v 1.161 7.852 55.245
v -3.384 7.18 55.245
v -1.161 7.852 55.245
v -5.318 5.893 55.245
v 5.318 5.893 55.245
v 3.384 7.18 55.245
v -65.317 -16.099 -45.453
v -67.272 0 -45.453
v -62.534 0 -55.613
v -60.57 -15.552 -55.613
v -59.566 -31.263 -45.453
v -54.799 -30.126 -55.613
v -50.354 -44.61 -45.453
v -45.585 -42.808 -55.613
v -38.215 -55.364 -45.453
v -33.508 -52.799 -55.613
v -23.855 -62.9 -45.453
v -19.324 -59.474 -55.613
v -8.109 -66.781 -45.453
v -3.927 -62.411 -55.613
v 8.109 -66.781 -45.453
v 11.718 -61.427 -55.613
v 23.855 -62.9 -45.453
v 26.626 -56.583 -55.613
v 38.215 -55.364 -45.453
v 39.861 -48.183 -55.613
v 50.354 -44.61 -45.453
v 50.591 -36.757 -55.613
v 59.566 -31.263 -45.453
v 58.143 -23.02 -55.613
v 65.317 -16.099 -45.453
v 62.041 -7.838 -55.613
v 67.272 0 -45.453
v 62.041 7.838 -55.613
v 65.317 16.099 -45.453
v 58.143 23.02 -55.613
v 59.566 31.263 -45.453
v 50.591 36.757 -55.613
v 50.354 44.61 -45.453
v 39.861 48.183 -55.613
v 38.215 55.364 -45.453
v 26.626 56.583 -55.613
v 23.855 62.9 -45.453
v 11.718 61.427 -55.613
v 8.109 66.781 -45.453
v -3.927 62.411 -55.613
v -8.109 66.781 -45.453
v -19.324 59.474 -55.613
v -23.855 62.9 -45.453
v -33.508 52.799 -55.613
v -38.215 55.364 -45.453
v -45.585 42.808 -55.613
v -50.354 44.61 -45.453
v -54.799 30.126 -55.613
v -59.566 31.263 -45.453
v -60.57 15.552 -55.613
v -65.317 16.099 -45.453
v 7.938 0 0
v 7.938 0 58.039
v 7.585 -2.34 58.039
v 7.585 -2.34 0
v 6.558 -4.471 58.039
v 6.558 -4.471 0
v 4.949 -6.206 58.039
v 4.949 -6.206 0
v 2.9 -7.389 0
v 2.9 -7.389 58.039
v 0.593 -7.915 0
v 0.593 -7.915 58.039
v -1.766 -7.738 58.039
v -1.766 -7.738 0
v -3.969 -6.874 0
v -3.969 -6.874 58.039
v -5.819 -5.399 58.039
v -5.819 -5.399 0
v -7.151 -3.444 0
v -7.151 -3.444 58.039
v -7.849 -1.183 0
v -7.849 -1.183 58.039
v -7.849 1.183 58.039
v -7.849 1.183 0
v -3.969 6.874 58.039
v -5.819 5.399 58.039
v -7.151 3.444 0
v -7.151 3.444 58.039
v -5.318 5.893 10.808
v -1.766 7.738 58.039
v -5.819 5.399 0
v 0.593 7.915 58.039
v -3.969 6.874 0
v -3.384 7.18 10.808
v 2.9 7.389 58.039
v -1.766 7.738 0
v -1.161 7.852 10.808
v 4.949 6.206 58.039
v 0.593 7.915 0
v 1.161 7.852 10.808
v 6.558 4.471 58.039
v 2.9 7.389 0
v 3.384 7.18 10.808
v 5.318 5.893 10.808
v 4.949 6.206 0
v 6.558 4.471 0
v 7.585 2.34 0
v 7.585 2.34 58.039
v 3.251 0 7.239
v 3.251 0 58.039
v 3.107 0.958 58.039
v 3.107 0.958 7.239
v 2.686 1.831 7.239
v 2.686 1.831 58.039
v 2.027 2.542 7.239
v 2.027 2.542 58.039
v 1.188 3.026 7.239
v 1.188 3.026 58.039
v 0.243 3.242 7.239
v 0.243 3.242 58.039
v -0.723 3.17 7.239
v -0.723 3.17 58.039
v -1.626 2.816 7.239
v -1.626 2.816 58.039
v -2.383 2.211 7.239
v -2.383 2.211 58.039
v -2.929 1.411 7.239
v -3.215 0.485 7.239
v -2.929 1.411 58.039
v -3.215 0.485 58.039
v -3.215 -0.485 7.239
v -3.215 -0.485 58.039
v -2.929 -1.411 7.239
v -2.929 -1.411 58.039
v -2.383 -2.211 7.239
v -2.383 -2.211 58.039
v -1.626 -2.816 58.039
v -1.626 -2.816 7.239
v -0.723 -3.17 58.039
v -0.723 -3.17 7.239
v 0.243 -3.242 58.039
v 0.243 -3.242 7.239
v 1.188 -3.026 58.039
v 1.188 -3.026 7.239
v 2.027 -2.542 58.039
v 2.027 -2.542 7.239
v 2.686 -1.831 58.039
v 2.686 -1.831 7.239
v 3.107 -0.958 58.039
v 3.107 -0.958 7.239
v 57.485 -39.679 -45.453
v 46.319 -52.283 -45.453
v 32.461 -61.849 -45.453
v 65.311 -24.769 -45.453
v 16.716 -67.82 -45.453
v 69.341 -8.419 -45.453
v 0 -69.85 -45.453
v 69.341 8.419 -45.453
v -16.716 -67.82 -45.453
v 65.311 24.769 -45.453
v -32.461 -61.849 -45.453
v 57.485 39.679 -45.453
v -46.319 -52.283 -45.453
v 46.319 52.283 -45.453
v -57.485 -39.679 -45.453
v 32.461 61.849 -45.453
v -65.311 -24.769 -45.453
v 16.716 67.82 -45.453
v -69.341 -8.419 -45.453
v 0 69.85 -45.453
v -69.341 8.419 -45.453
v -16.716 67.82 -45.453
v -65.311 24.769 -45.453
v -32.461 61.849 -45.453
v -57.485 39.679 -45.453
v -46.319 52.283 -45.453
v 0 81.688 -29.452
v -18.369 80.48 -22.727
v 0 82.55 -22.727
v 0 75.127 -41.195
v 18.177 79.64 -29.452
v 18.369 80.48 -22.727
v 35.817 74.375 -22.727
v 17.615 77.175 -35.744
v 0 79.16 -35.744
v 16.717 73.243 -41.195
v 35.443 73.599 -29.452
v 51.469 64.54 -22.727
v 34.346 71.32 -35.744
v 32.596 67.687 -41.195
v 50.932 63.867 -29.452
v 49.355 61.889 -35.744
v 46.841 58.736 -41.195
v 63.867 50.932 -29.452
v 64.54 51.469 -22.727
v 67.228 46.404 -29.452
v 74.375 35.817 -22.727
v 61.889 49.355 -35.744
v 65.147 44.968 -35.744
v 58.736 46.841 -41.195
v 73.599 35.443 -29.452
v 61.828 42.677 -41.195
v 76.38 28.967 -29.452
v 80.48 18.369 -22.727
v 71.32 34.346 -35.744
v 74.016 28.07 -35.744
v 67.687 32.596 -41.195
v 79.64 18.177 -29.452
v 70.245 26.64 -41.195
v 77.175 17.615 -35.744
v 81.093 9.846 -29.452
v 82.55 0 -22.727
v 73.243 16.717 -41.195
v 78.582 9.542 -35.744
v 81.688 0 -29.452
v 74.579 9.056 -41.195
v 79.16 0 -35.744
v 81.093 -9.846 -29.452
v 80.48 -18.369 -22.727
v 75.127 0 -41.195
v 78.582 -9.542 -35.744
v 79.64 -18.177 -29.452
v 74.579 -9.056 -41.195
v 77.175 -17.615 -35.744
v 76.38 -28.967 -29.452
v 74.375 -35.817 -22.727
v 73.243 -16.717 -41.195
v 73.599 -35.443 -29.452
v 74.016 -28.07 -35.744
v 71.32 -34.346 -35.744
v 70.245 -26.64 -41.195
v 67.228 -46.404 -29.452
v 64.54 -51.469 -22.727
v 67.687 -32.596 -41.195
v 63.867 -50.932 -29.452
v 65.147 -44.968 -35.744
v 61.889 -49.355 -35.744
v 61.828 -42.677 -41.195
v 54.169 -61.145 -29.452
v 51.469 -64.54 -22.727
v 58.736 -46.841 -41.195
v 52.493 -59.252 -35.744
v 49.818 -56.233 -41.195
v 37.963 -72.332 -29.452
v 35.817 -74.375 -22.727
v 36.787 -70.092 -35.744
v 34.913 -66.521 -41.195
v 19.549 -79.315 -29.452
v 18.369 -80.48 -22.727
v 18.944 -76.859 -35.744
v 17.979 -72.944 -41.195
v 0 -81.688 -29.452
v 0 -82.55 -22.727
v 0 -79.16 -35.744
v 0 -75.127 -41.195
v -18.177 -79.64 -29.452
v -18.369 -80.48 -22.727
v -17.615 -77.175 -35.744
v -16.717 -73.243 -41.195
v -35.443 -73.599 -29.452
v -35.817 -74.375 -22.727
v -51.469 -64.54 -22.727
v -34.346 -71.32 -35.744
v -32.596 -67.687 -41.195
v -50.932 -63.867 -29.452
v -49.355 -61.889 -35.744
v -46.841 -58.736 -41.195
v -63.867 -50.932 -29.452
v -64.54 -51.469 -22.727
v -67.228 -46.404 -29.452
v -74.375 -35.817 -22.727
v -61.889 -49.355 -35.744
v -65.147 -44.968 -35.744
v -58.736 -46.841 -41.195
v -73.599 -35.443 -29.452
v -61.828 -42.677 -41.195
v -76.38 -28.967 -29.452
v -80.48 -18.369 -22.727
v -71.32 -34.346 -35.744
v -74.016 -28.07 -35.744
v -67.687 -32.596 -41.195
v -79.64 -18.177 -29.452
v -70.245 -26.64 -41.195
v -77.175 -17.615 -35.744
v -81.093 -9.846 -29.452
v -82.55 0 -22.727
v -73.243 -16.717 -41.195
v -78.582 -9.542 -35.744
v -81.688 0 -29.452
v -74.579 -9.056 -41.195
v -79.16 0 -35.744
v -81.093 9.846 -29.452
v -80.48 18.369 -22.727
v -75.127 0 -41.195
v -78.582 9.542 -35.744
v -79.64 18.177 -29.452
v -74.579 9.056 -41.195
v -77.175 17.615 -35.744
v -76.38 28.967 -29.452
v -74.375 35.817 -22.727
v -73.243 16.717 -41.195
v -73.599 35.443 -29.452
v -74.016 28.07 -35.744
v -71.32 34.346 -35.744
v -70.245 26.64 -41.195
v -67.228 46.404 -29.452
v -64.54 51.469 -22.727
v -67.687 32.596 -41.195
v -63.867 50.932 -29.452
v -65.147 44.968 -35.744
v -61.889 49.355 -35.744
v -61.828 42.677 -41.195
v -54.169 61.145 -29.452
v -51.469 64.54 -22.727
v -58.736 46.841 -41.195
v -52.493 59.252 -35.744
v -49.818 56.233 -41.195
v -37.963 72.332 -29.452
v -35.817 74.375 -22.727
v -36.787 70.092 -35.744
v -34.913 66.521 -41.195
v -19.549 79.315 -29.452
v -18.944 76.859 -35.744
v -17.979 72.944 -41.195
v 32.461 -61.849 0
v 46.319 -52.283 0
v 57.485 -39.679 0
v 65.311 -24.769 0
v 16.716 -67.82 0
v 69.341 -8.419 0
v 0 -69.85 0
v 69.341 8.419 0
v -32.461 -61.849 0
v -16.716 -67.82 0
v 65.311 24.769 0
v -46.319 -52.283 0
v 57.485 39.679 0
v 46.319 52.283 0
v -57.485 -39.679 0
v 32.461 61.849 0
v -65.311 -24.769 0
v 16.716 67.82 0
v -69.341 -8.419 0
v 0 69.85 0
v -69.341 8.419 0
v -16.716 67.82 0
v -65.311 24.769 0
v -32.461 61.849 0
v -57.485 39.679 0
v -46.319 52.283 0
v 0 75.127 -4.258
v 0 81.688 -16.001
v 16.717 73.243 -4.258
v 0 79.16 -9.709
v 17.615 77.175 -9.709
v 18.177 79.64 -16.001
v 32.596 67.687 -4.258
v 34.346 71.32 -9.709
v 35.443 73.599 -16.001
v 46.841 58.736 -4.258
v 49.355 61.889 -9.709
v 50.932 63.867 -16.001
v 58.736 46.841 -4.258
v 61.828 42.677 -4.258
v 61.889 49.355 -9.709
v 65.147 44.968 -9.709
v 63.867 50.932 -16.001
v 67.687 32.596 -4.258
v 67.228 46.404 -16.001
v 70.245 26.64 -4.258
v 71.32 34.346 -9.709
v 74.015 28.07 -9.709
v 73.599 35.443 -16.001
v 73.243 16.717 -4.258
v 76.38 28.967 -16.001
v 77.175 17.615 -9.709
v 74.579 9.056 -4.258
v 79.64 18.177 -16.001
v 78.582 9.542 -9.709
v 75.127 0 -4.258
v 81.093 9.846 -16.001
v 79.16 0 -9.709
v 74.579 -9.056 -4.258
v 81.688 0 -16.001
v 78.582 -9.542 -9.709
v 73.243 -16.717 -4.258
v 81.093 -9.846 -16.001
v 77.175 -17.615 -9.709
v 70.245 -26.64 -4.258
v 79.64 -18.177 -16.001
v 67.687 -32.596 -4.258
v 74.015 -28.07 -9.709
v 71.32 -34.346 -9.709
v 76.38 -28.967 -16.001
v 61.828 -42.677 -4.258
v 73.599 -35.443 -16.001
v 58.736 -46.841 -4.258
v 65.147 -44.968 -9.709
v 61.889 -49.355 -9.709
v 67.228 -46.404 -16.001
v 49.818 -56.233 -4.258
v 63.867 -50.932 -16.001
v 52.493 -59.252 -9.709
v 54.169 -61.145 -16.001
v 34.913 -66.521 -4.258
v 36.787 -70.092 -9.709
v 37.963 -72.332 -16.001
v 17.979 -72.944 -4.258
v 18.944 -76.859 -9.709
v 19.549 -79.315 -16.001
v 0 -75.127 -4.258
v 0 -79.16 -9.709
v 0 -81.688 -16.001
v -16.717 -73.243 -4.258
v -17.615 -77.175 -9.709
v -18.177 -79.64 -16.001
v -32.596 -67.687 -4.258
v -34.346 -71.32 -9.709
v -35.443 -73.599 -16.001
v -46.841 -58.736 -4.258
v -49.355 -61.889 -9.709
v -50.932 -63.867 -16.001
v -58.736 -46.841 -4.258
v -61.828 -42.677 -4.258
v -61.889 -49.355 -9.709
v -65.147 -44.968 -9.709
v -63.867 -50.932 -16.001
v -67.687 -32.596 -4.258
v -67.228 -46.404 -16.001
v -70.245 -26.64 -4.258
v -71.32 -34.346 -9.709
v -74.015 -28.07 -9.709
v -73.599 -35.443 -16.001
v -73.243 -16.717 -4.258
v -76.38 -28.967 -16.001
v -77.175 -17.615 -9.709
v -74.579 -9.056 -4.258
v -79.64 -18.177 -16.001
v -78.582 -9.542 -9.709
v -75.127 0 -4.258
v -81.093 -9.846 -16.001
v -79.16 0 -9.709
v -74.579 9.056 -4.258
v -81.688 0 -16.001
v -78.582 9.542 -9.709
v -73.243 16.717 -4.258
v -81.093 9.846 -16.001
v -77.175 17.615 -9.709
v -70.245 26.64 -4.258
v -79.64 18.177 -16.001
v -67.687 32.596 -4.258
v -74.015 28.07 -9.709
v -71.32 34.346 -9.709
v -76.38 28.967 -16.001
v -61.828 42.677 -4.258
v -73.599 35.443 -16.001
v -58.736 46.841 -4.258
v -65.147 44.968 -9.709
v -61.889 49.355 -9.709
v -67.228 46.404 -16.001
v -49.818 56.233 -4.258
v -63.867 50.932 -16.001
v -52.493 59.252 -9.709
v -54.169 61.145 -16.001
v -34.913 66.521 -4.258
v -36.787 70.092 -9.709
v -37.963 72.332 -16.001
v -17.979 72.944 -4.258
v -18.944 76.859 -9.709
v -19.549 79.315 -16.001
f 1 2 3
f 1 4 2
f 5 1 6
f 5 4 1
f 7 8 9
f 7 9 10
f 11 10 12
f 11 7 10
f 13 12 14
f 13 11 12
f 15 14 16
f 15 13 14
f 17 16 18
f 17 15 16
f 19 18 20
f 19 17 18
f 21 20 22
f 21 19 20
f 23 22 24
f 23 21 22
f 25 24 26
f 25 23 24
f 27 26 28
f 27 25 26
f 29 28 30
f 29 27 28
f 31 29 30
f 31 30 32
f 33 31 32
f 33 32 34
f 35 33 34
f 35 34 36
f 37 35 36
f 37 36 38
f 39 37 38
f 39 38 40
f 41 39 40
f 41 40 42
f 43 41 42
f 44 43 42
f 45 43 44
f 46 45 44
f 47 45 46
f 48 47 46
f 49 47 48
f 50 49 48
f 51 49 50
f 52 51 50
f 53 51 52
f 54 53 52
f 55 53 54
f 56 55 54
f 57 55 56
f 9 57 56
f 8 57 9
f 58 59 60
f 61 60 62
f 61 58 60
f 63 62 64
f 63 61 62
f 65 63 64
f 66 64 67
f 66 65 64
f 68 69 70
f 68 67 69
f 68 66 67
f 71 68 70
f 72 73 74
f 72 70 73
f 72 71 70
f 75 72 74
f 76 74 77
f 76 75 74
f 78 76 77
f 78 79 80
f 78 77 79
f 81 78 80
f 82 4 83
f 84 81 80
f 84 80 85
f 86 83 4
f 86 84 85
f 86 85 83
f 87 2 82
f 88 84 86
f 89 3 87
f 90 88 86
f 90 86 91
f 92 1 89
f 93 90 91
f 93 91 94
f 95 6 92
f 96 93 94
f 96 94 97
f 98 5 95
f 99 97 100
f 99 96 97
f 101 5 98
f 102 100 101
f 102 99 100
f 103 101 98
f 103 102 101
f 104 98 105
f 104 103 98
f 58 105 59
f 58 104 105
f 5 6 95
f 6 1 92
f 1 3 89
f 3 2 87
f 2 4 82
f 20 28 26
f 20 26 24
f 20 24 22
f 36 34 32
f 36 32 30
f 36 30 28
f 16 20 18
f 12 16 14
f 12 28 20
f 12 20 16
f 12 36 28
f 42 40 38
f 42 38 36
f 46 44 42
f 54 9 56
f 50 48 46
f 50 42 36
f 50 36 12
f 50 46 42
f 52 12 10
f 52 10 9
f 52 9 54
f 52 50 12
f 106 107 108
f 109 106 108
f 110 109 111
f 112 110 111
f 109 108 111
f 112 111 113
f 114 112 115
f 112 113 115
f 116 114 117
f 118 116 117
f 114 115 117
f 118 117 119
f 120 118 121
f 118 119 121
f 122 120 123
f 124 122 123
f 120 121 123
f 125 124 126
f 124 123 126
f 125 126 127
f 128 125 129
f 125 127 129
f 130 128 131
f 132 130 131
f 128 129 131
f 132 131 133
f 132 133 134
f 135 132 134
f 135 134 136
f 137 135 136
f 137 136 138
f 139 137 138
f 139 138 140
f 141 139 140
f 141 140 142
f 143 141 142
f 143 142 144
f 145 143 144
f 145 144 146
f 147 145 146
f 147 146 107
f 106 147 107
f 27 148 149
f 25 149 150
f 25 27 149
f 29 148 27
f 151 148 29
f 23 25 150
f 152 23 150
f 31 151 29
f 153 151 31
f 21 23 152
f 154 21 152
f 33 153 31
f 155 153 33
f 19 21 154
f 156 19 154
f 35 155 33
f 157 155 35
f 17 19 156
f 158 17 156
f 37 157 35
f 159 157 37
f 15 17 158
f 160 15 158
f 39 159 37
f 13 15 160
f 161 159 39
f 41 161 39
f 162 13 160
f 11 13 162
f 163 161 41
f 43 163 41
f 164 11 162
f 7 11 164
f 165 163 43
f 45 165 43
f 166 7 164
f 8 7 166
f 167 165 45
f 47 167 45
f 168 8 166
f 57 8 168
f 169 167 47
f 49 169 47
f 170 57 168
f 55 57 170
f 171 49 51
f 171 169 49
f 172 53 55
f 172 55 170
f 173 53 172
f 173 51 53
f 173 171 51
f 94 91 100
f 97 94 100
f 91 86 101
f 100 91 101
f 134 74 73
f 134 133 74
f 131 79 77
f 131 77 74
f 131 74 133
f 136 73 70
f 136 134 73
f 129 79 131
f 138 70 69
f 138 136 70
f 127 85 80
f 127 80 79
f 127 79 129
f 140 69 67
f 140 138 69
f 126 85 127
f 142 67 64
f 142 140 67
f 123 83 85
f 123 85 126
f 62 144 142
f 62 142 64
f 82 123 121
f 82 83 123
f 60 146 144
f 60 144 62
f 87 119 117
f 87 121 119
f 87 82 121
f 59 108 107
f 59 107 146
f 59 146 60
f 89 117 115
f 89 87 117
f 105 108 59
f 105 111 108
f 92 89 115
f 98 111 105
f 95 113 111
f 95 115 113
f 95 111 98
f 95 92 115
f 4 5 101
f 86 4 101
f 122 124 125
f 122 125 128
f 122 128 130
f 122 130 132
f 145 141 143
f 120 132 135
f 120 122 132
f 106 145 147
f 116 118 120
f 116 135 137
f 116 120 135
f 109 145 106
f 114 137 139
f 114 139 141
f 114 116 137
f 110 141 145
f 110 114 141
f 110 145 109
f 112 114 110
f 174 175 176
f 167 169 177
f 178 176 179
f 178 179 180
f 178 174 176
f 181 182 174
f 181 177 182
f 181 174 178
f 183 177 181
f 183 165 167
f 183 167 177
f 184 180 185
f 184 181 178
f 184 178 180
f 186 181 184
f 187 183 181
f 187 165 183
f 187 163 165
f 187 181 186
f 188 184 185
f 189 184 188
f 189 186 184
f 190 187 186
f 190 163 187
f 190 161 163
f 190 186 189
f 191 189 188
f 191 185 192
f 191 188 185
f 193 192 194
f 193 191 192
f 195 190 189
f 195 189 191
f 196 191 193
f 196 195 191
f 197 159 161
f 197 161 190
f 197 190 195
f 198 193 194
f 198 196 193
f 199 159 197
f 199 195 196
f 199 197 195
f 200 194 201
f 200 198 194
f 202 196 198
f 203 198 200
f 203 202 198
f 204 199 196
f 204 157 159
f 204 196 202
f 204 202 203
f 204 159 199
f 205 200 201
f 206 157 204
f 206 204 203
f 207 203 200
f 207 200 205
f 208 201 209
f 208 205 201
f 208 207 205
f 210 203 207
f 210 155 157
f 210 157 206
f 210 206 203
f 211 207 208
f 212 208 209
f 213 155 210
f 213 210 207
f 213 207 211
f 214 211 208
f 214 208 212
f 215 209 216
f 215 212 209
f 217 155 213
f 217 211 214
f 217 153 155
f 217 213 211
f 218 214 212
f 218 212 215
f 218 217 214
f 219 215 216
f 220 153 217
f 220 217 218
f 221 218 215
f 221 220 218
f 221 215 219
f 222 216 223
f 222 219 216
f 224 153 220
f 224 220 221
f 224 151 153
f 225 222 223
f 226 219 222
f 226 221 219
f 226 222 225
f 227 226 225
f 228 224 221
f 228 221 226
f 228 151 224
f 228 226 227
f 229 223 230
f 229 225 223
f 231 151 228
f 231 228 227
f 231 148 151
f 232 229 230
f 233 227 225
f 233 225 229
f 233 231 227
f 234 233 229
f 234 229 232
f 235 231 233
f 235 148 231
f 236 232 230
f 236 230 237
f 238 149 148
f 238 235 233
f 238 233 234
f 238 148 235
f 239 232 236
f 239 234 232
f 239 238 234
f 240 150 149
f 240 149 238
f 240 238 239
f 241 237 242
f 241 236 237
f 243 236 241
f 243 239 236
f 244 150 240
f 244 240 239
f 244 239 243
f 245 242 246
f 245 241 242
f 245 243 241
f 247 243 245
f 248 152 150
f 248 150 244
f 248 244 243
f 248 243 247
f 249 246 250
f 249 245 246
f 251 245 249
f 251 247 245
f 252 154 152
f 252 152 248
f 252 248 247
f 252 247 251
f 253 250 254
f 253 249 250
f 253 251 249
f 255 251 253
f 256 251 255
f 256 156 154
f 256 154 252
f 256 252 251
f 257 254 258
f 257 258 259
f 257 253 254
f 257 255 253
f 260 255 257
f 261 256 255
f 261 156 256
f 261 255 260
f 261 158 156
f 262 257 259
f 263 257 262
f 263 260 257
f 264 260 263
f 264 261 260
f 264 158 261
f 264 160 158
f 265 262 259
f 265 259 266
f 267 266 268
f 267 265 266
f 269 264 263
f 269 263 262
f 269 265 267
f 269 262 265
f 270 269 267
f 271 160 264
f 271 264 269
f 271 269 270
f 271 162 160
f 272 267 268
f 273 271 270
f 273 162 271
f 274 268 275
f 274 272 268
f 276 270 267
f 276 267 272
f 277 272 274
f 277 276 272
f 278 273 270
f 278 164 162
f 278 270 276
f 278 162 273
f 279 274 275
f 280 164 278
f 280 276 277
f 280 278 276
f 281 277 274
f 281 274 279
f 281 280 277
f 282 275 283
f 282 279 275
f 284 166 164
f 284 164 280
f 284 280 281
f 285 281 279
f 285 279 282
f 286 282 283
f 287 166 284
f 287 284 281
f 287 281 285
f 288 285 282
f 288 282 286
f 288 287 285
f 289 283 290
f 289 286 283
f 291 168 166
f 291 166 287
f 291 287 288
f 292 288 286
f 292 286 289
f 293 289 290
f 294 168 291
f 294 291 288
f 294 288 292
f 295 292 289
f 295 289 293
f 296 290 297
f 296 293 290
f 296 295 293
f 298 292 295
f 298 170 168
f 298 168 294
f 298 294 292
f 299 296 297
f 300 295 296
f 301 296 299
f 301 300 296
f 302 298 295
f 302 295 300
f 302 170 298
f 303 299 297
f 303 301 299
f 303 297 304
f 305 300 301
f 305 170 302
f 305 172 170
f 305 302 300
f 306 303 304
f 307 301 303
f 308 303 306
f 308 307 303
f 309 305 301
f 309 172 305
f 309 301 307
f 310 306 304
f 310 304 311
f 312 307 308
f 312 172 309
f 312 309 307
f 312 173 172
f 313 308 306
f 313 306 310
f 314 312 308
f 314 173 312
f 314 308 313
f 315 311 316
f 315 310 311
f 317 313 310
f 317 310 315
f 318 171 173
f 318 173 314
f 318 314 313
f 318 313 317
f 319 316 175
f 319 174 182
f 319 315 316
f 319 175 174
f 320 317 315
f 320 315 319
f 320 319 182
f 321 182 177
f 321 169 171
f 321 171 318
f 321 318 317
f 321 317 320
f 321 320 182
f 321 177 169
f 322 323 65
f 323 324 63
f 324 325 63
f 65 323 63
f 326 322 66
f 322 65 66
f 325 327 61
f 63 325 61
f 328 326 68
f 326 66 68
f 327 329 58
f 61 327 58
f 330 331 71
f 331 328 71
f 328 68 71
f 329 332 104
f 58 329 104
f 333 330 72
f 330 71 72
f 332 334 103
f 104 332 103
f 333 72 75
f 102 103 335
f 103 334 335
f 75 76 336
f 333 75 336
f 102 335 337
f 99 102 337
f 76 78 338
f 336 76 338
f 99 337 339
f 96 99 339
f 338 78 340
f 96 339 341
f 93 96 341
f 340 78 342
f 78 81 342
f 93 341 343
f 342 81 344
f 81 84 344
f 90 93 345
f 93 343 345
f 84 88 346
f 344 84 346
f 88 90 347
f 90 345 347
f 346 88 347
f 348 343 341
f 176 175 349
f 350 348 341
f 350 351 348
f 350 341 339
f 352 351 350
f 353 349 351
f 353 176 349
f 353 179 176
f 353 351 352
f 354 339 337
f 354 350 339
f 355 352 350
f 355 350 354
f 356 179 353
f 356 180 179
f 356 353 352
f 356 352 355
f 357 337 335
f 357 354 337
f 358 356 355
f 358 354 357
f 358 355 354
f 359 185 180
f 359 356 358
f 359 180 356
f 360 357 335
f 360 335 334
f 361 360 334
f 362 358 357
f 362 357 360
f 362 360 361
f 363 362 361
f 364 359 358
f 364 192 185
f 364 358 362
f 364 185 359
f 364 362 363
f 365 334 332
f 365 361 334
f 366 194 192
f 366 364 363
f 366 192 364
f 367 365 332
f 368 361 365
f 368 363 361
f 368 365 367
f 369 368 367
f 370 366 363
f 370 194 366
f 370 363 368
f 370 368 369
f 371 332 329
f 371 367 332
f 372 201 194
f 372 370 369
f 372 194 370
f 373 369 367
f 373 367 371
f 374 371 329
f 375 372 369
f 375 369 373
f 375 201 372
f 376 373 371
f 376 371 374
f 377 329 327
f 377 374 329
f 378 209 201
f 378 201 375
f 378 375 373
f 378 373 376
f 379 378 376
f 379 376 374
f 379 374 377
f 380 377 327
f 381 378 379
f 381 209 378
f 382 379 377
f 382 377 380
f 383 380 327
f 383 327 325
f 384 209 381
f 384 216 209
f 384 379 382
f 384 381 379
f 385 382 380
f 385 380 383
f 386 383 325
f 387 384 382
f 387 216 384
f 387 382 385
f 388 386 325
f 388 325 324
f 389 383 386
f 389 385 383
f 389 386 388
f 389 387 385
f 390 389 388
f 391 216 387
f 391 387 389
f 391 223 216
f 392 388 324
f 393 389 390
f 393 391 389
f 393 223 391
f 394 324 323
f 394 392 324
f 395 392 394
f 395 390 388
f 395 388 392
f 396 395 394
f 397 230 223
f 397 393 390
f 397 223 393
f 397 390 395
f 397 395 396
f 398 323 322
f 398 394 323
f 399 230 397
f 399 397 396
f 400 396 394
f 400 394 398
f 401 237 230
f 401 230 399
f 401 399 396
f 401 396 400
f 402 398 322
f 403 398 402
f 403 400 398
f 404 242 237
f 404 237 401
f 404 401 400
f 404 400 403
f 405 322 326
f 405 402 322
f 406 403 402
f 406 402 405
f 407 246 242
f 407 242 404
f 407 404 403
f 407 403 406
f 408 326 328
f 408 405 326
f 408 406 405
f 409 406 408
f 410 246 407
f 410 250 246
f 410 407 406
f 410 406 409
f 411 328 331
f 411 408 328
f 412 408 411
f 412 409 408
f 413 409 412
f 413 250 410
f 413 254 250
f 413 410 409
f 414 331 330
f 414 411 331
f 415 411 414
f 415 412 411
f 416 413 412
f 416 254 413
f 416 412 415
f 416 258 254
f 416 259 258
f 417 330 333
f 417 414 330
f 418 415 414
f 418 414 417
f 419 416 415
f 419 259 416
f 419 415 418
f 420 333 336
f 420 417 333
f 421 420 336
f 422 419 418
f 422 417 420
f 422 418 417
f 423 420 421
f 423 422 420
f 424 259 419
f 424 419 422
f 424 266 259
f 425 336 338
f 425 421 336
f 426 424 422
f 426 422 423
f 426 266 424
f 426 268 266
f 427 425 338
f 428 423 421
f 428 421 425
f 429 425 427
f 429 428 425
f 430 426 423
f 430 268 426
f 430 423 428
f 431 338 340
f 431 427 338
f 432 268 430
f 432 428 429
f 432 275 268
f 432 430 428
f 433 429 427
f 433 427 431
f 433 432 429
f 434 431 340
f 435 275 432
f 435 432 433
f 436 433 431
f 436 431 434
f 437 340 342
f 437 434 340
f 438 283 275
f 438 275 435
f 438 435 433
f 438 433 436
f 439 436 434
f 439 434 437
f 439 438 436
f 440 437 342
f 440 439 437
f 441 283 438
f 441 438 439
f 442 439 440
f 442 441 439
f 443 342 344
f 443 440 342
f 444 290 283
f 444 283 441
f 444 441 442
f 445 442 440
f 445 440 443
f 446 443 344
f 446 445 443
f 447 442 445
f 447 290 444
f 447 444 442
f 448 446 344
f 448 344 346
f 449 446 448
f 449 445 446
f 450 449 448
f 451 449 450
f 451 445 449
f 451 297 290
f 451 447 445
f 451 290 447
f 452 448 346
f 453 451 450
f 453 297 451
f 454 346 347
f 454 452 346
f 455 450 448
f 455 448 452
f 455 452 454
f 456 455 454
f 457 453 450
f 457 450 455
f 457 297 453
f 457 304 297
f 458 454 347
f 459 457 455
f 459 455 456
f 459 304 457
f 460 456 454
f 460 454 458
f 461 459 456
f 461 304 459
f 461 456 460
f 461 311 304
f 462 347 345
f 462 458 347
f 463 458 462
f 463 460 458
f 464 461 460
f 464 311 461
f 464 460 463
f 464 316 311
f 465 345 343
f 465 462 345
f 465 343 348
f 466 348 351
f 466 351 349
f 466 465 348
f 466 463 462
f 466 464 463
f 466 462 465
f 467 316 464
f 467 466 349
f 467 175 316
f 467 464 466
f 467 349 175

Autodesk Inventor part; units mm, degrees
ref_plane "XZ Plane" through (0, 0, 0) normal (0, 1, 0) x (-1, 0, 0)
ref_plane "XY Plane" through (0, 0, 0) normal (0, 0, 1) x (1, 0, 0)
sketch "Sketch1" plane through (0, 0, 0) normal (0, 0, 1) x (1, 0, 0)
  circle A0 centre (0, 0) radius 7.9375
  dimension "d0" = 15.875
extrude "Extrusion1" add sketch "Sketch1" along normal blind 58.039
sketch "Sketch2" plane through (0, 0, 0) normal (0, 0, -1) x (-1, 0, 0)
  circle A0 centre (0, 0) radius 82.55
  dimension "d3" = 165.1
extrude "Extrusion2" add sketch "Sketch2" along normal blind 45.4533
sketch "Sketch3" plane through (0, 0, -45.4533) normal (0, 0, -1) x (-1, 0, 0)
  circle A0 centre (0, 0) radius 67.2719
  circle A1 centre (0, 0) radius 53.975
  dimension "d6" = 134.5438
  dimension "d20" = 107.95
ref_plane "Work Plane3" through (0, 0, -45.4533) normal (0, 0, -1) x (-1, 0, 0)
sketch "Sketch4" plane through (0, 0, -45.4533) normal (0, 0, -1) x (-1, 0, 0)
  point P0 (0, 0)
ref_plane "Work Plane1" through (7.9375, 0, 0) normal (1, 0, 0) x (0, 1, 0)
sketch "Sketch5" plane through (7.9375, 0, 0) normal (1, 0, 0) x (0, 1, 0)
  line L0 (-7.9375, 0) -> (-7.9375, 58.039) projected
  line L1 (7.9375, 58.039) -> (-7.9375, 58.039) projected
  line L2 (7.9375, 58.039) -> (-7.9375, 58.039) projected
  line L3 (7.9375, 0) -> (-7.9375, 0) projected
  line L4 (7.9375, 0) -> (7.9375, 58.039) projected
  line L5 (5.8928, 55.245) -> (5.8928, 10.8077)
  line L6 (5.8928, 55.245) -> (7.9375, 55.245)
  line L7 (5.8928, 10.8077) -> (7.9375, 10.8077)
  point P0 (0, 0)
  dimension "d9" = 13.8303
  dimension "d10" = 2.794
  dimension "d11" = 10.8077
extrude "Extrusion4" cut sketch "Sketch5" against normal blind 50.8 contours L7 L5 L6 L4
sketch "Sketch6" plane through (0, 0, 58.039) normal (0, 0, 1) x (1, 0, 0)
  circle A0 centre (0, 0) radius 3.2512
  dimension "d14" = 6.5024
ref_plane "Work Plane2" through (0, 0, -49.2633) normal (-1, 0, 0) x (0, 0, 1)
extrude "Extrusion6" add sketch "Sketch3" along normal blind 10.16 draft -25
extrude "Extrusion7" add sketch "Sketch3" along normal blind 10.16 draft 25 contours A1
sketch "Sketch8" plane through (0, 0, -49.2633) normal (-1, 0, 0) x (0, 0, 1)
  line L0 (49.2633, 82.55) -> (3.81, 82.55) projected
  line L1 (26.5367, 82.55) -> (26.5367, 46.429)
  arc A0 (49.2633, 69.85) -> (26.5367, 82.55) centre (26.5367, 55.8653) ccw
  line L2 (49.2633, 82.55) -> (49.2633, -82.55) projected
  arc A1 (26.5367, 82.55) -> (3.81, 69.85) centre (26.5367, 55.8653) ccw
  line L3 (49.2633, 82.55) -> (3.81, 82.55) projected
  line L4 (3.81, 82.55) -> (3.81, -82.55) projected
  line L5 (-29.0805, 0) -> (130.0328, 0) projected
  point P0 (49.2633, 0)
  dimension "d25" = 0
  dimension "d26" = 12.7
revolve "Revolution2" cut sketch "Sketch8" angle 360 about axis through (0, 0, -49.2633) along (0, 0, 1) contours L2 A0 L0 | A1 L4 L0
extrude "Extrusion8" cut sketch "Sketch6" against normal blind 50.8
properties part number "Wheel"
